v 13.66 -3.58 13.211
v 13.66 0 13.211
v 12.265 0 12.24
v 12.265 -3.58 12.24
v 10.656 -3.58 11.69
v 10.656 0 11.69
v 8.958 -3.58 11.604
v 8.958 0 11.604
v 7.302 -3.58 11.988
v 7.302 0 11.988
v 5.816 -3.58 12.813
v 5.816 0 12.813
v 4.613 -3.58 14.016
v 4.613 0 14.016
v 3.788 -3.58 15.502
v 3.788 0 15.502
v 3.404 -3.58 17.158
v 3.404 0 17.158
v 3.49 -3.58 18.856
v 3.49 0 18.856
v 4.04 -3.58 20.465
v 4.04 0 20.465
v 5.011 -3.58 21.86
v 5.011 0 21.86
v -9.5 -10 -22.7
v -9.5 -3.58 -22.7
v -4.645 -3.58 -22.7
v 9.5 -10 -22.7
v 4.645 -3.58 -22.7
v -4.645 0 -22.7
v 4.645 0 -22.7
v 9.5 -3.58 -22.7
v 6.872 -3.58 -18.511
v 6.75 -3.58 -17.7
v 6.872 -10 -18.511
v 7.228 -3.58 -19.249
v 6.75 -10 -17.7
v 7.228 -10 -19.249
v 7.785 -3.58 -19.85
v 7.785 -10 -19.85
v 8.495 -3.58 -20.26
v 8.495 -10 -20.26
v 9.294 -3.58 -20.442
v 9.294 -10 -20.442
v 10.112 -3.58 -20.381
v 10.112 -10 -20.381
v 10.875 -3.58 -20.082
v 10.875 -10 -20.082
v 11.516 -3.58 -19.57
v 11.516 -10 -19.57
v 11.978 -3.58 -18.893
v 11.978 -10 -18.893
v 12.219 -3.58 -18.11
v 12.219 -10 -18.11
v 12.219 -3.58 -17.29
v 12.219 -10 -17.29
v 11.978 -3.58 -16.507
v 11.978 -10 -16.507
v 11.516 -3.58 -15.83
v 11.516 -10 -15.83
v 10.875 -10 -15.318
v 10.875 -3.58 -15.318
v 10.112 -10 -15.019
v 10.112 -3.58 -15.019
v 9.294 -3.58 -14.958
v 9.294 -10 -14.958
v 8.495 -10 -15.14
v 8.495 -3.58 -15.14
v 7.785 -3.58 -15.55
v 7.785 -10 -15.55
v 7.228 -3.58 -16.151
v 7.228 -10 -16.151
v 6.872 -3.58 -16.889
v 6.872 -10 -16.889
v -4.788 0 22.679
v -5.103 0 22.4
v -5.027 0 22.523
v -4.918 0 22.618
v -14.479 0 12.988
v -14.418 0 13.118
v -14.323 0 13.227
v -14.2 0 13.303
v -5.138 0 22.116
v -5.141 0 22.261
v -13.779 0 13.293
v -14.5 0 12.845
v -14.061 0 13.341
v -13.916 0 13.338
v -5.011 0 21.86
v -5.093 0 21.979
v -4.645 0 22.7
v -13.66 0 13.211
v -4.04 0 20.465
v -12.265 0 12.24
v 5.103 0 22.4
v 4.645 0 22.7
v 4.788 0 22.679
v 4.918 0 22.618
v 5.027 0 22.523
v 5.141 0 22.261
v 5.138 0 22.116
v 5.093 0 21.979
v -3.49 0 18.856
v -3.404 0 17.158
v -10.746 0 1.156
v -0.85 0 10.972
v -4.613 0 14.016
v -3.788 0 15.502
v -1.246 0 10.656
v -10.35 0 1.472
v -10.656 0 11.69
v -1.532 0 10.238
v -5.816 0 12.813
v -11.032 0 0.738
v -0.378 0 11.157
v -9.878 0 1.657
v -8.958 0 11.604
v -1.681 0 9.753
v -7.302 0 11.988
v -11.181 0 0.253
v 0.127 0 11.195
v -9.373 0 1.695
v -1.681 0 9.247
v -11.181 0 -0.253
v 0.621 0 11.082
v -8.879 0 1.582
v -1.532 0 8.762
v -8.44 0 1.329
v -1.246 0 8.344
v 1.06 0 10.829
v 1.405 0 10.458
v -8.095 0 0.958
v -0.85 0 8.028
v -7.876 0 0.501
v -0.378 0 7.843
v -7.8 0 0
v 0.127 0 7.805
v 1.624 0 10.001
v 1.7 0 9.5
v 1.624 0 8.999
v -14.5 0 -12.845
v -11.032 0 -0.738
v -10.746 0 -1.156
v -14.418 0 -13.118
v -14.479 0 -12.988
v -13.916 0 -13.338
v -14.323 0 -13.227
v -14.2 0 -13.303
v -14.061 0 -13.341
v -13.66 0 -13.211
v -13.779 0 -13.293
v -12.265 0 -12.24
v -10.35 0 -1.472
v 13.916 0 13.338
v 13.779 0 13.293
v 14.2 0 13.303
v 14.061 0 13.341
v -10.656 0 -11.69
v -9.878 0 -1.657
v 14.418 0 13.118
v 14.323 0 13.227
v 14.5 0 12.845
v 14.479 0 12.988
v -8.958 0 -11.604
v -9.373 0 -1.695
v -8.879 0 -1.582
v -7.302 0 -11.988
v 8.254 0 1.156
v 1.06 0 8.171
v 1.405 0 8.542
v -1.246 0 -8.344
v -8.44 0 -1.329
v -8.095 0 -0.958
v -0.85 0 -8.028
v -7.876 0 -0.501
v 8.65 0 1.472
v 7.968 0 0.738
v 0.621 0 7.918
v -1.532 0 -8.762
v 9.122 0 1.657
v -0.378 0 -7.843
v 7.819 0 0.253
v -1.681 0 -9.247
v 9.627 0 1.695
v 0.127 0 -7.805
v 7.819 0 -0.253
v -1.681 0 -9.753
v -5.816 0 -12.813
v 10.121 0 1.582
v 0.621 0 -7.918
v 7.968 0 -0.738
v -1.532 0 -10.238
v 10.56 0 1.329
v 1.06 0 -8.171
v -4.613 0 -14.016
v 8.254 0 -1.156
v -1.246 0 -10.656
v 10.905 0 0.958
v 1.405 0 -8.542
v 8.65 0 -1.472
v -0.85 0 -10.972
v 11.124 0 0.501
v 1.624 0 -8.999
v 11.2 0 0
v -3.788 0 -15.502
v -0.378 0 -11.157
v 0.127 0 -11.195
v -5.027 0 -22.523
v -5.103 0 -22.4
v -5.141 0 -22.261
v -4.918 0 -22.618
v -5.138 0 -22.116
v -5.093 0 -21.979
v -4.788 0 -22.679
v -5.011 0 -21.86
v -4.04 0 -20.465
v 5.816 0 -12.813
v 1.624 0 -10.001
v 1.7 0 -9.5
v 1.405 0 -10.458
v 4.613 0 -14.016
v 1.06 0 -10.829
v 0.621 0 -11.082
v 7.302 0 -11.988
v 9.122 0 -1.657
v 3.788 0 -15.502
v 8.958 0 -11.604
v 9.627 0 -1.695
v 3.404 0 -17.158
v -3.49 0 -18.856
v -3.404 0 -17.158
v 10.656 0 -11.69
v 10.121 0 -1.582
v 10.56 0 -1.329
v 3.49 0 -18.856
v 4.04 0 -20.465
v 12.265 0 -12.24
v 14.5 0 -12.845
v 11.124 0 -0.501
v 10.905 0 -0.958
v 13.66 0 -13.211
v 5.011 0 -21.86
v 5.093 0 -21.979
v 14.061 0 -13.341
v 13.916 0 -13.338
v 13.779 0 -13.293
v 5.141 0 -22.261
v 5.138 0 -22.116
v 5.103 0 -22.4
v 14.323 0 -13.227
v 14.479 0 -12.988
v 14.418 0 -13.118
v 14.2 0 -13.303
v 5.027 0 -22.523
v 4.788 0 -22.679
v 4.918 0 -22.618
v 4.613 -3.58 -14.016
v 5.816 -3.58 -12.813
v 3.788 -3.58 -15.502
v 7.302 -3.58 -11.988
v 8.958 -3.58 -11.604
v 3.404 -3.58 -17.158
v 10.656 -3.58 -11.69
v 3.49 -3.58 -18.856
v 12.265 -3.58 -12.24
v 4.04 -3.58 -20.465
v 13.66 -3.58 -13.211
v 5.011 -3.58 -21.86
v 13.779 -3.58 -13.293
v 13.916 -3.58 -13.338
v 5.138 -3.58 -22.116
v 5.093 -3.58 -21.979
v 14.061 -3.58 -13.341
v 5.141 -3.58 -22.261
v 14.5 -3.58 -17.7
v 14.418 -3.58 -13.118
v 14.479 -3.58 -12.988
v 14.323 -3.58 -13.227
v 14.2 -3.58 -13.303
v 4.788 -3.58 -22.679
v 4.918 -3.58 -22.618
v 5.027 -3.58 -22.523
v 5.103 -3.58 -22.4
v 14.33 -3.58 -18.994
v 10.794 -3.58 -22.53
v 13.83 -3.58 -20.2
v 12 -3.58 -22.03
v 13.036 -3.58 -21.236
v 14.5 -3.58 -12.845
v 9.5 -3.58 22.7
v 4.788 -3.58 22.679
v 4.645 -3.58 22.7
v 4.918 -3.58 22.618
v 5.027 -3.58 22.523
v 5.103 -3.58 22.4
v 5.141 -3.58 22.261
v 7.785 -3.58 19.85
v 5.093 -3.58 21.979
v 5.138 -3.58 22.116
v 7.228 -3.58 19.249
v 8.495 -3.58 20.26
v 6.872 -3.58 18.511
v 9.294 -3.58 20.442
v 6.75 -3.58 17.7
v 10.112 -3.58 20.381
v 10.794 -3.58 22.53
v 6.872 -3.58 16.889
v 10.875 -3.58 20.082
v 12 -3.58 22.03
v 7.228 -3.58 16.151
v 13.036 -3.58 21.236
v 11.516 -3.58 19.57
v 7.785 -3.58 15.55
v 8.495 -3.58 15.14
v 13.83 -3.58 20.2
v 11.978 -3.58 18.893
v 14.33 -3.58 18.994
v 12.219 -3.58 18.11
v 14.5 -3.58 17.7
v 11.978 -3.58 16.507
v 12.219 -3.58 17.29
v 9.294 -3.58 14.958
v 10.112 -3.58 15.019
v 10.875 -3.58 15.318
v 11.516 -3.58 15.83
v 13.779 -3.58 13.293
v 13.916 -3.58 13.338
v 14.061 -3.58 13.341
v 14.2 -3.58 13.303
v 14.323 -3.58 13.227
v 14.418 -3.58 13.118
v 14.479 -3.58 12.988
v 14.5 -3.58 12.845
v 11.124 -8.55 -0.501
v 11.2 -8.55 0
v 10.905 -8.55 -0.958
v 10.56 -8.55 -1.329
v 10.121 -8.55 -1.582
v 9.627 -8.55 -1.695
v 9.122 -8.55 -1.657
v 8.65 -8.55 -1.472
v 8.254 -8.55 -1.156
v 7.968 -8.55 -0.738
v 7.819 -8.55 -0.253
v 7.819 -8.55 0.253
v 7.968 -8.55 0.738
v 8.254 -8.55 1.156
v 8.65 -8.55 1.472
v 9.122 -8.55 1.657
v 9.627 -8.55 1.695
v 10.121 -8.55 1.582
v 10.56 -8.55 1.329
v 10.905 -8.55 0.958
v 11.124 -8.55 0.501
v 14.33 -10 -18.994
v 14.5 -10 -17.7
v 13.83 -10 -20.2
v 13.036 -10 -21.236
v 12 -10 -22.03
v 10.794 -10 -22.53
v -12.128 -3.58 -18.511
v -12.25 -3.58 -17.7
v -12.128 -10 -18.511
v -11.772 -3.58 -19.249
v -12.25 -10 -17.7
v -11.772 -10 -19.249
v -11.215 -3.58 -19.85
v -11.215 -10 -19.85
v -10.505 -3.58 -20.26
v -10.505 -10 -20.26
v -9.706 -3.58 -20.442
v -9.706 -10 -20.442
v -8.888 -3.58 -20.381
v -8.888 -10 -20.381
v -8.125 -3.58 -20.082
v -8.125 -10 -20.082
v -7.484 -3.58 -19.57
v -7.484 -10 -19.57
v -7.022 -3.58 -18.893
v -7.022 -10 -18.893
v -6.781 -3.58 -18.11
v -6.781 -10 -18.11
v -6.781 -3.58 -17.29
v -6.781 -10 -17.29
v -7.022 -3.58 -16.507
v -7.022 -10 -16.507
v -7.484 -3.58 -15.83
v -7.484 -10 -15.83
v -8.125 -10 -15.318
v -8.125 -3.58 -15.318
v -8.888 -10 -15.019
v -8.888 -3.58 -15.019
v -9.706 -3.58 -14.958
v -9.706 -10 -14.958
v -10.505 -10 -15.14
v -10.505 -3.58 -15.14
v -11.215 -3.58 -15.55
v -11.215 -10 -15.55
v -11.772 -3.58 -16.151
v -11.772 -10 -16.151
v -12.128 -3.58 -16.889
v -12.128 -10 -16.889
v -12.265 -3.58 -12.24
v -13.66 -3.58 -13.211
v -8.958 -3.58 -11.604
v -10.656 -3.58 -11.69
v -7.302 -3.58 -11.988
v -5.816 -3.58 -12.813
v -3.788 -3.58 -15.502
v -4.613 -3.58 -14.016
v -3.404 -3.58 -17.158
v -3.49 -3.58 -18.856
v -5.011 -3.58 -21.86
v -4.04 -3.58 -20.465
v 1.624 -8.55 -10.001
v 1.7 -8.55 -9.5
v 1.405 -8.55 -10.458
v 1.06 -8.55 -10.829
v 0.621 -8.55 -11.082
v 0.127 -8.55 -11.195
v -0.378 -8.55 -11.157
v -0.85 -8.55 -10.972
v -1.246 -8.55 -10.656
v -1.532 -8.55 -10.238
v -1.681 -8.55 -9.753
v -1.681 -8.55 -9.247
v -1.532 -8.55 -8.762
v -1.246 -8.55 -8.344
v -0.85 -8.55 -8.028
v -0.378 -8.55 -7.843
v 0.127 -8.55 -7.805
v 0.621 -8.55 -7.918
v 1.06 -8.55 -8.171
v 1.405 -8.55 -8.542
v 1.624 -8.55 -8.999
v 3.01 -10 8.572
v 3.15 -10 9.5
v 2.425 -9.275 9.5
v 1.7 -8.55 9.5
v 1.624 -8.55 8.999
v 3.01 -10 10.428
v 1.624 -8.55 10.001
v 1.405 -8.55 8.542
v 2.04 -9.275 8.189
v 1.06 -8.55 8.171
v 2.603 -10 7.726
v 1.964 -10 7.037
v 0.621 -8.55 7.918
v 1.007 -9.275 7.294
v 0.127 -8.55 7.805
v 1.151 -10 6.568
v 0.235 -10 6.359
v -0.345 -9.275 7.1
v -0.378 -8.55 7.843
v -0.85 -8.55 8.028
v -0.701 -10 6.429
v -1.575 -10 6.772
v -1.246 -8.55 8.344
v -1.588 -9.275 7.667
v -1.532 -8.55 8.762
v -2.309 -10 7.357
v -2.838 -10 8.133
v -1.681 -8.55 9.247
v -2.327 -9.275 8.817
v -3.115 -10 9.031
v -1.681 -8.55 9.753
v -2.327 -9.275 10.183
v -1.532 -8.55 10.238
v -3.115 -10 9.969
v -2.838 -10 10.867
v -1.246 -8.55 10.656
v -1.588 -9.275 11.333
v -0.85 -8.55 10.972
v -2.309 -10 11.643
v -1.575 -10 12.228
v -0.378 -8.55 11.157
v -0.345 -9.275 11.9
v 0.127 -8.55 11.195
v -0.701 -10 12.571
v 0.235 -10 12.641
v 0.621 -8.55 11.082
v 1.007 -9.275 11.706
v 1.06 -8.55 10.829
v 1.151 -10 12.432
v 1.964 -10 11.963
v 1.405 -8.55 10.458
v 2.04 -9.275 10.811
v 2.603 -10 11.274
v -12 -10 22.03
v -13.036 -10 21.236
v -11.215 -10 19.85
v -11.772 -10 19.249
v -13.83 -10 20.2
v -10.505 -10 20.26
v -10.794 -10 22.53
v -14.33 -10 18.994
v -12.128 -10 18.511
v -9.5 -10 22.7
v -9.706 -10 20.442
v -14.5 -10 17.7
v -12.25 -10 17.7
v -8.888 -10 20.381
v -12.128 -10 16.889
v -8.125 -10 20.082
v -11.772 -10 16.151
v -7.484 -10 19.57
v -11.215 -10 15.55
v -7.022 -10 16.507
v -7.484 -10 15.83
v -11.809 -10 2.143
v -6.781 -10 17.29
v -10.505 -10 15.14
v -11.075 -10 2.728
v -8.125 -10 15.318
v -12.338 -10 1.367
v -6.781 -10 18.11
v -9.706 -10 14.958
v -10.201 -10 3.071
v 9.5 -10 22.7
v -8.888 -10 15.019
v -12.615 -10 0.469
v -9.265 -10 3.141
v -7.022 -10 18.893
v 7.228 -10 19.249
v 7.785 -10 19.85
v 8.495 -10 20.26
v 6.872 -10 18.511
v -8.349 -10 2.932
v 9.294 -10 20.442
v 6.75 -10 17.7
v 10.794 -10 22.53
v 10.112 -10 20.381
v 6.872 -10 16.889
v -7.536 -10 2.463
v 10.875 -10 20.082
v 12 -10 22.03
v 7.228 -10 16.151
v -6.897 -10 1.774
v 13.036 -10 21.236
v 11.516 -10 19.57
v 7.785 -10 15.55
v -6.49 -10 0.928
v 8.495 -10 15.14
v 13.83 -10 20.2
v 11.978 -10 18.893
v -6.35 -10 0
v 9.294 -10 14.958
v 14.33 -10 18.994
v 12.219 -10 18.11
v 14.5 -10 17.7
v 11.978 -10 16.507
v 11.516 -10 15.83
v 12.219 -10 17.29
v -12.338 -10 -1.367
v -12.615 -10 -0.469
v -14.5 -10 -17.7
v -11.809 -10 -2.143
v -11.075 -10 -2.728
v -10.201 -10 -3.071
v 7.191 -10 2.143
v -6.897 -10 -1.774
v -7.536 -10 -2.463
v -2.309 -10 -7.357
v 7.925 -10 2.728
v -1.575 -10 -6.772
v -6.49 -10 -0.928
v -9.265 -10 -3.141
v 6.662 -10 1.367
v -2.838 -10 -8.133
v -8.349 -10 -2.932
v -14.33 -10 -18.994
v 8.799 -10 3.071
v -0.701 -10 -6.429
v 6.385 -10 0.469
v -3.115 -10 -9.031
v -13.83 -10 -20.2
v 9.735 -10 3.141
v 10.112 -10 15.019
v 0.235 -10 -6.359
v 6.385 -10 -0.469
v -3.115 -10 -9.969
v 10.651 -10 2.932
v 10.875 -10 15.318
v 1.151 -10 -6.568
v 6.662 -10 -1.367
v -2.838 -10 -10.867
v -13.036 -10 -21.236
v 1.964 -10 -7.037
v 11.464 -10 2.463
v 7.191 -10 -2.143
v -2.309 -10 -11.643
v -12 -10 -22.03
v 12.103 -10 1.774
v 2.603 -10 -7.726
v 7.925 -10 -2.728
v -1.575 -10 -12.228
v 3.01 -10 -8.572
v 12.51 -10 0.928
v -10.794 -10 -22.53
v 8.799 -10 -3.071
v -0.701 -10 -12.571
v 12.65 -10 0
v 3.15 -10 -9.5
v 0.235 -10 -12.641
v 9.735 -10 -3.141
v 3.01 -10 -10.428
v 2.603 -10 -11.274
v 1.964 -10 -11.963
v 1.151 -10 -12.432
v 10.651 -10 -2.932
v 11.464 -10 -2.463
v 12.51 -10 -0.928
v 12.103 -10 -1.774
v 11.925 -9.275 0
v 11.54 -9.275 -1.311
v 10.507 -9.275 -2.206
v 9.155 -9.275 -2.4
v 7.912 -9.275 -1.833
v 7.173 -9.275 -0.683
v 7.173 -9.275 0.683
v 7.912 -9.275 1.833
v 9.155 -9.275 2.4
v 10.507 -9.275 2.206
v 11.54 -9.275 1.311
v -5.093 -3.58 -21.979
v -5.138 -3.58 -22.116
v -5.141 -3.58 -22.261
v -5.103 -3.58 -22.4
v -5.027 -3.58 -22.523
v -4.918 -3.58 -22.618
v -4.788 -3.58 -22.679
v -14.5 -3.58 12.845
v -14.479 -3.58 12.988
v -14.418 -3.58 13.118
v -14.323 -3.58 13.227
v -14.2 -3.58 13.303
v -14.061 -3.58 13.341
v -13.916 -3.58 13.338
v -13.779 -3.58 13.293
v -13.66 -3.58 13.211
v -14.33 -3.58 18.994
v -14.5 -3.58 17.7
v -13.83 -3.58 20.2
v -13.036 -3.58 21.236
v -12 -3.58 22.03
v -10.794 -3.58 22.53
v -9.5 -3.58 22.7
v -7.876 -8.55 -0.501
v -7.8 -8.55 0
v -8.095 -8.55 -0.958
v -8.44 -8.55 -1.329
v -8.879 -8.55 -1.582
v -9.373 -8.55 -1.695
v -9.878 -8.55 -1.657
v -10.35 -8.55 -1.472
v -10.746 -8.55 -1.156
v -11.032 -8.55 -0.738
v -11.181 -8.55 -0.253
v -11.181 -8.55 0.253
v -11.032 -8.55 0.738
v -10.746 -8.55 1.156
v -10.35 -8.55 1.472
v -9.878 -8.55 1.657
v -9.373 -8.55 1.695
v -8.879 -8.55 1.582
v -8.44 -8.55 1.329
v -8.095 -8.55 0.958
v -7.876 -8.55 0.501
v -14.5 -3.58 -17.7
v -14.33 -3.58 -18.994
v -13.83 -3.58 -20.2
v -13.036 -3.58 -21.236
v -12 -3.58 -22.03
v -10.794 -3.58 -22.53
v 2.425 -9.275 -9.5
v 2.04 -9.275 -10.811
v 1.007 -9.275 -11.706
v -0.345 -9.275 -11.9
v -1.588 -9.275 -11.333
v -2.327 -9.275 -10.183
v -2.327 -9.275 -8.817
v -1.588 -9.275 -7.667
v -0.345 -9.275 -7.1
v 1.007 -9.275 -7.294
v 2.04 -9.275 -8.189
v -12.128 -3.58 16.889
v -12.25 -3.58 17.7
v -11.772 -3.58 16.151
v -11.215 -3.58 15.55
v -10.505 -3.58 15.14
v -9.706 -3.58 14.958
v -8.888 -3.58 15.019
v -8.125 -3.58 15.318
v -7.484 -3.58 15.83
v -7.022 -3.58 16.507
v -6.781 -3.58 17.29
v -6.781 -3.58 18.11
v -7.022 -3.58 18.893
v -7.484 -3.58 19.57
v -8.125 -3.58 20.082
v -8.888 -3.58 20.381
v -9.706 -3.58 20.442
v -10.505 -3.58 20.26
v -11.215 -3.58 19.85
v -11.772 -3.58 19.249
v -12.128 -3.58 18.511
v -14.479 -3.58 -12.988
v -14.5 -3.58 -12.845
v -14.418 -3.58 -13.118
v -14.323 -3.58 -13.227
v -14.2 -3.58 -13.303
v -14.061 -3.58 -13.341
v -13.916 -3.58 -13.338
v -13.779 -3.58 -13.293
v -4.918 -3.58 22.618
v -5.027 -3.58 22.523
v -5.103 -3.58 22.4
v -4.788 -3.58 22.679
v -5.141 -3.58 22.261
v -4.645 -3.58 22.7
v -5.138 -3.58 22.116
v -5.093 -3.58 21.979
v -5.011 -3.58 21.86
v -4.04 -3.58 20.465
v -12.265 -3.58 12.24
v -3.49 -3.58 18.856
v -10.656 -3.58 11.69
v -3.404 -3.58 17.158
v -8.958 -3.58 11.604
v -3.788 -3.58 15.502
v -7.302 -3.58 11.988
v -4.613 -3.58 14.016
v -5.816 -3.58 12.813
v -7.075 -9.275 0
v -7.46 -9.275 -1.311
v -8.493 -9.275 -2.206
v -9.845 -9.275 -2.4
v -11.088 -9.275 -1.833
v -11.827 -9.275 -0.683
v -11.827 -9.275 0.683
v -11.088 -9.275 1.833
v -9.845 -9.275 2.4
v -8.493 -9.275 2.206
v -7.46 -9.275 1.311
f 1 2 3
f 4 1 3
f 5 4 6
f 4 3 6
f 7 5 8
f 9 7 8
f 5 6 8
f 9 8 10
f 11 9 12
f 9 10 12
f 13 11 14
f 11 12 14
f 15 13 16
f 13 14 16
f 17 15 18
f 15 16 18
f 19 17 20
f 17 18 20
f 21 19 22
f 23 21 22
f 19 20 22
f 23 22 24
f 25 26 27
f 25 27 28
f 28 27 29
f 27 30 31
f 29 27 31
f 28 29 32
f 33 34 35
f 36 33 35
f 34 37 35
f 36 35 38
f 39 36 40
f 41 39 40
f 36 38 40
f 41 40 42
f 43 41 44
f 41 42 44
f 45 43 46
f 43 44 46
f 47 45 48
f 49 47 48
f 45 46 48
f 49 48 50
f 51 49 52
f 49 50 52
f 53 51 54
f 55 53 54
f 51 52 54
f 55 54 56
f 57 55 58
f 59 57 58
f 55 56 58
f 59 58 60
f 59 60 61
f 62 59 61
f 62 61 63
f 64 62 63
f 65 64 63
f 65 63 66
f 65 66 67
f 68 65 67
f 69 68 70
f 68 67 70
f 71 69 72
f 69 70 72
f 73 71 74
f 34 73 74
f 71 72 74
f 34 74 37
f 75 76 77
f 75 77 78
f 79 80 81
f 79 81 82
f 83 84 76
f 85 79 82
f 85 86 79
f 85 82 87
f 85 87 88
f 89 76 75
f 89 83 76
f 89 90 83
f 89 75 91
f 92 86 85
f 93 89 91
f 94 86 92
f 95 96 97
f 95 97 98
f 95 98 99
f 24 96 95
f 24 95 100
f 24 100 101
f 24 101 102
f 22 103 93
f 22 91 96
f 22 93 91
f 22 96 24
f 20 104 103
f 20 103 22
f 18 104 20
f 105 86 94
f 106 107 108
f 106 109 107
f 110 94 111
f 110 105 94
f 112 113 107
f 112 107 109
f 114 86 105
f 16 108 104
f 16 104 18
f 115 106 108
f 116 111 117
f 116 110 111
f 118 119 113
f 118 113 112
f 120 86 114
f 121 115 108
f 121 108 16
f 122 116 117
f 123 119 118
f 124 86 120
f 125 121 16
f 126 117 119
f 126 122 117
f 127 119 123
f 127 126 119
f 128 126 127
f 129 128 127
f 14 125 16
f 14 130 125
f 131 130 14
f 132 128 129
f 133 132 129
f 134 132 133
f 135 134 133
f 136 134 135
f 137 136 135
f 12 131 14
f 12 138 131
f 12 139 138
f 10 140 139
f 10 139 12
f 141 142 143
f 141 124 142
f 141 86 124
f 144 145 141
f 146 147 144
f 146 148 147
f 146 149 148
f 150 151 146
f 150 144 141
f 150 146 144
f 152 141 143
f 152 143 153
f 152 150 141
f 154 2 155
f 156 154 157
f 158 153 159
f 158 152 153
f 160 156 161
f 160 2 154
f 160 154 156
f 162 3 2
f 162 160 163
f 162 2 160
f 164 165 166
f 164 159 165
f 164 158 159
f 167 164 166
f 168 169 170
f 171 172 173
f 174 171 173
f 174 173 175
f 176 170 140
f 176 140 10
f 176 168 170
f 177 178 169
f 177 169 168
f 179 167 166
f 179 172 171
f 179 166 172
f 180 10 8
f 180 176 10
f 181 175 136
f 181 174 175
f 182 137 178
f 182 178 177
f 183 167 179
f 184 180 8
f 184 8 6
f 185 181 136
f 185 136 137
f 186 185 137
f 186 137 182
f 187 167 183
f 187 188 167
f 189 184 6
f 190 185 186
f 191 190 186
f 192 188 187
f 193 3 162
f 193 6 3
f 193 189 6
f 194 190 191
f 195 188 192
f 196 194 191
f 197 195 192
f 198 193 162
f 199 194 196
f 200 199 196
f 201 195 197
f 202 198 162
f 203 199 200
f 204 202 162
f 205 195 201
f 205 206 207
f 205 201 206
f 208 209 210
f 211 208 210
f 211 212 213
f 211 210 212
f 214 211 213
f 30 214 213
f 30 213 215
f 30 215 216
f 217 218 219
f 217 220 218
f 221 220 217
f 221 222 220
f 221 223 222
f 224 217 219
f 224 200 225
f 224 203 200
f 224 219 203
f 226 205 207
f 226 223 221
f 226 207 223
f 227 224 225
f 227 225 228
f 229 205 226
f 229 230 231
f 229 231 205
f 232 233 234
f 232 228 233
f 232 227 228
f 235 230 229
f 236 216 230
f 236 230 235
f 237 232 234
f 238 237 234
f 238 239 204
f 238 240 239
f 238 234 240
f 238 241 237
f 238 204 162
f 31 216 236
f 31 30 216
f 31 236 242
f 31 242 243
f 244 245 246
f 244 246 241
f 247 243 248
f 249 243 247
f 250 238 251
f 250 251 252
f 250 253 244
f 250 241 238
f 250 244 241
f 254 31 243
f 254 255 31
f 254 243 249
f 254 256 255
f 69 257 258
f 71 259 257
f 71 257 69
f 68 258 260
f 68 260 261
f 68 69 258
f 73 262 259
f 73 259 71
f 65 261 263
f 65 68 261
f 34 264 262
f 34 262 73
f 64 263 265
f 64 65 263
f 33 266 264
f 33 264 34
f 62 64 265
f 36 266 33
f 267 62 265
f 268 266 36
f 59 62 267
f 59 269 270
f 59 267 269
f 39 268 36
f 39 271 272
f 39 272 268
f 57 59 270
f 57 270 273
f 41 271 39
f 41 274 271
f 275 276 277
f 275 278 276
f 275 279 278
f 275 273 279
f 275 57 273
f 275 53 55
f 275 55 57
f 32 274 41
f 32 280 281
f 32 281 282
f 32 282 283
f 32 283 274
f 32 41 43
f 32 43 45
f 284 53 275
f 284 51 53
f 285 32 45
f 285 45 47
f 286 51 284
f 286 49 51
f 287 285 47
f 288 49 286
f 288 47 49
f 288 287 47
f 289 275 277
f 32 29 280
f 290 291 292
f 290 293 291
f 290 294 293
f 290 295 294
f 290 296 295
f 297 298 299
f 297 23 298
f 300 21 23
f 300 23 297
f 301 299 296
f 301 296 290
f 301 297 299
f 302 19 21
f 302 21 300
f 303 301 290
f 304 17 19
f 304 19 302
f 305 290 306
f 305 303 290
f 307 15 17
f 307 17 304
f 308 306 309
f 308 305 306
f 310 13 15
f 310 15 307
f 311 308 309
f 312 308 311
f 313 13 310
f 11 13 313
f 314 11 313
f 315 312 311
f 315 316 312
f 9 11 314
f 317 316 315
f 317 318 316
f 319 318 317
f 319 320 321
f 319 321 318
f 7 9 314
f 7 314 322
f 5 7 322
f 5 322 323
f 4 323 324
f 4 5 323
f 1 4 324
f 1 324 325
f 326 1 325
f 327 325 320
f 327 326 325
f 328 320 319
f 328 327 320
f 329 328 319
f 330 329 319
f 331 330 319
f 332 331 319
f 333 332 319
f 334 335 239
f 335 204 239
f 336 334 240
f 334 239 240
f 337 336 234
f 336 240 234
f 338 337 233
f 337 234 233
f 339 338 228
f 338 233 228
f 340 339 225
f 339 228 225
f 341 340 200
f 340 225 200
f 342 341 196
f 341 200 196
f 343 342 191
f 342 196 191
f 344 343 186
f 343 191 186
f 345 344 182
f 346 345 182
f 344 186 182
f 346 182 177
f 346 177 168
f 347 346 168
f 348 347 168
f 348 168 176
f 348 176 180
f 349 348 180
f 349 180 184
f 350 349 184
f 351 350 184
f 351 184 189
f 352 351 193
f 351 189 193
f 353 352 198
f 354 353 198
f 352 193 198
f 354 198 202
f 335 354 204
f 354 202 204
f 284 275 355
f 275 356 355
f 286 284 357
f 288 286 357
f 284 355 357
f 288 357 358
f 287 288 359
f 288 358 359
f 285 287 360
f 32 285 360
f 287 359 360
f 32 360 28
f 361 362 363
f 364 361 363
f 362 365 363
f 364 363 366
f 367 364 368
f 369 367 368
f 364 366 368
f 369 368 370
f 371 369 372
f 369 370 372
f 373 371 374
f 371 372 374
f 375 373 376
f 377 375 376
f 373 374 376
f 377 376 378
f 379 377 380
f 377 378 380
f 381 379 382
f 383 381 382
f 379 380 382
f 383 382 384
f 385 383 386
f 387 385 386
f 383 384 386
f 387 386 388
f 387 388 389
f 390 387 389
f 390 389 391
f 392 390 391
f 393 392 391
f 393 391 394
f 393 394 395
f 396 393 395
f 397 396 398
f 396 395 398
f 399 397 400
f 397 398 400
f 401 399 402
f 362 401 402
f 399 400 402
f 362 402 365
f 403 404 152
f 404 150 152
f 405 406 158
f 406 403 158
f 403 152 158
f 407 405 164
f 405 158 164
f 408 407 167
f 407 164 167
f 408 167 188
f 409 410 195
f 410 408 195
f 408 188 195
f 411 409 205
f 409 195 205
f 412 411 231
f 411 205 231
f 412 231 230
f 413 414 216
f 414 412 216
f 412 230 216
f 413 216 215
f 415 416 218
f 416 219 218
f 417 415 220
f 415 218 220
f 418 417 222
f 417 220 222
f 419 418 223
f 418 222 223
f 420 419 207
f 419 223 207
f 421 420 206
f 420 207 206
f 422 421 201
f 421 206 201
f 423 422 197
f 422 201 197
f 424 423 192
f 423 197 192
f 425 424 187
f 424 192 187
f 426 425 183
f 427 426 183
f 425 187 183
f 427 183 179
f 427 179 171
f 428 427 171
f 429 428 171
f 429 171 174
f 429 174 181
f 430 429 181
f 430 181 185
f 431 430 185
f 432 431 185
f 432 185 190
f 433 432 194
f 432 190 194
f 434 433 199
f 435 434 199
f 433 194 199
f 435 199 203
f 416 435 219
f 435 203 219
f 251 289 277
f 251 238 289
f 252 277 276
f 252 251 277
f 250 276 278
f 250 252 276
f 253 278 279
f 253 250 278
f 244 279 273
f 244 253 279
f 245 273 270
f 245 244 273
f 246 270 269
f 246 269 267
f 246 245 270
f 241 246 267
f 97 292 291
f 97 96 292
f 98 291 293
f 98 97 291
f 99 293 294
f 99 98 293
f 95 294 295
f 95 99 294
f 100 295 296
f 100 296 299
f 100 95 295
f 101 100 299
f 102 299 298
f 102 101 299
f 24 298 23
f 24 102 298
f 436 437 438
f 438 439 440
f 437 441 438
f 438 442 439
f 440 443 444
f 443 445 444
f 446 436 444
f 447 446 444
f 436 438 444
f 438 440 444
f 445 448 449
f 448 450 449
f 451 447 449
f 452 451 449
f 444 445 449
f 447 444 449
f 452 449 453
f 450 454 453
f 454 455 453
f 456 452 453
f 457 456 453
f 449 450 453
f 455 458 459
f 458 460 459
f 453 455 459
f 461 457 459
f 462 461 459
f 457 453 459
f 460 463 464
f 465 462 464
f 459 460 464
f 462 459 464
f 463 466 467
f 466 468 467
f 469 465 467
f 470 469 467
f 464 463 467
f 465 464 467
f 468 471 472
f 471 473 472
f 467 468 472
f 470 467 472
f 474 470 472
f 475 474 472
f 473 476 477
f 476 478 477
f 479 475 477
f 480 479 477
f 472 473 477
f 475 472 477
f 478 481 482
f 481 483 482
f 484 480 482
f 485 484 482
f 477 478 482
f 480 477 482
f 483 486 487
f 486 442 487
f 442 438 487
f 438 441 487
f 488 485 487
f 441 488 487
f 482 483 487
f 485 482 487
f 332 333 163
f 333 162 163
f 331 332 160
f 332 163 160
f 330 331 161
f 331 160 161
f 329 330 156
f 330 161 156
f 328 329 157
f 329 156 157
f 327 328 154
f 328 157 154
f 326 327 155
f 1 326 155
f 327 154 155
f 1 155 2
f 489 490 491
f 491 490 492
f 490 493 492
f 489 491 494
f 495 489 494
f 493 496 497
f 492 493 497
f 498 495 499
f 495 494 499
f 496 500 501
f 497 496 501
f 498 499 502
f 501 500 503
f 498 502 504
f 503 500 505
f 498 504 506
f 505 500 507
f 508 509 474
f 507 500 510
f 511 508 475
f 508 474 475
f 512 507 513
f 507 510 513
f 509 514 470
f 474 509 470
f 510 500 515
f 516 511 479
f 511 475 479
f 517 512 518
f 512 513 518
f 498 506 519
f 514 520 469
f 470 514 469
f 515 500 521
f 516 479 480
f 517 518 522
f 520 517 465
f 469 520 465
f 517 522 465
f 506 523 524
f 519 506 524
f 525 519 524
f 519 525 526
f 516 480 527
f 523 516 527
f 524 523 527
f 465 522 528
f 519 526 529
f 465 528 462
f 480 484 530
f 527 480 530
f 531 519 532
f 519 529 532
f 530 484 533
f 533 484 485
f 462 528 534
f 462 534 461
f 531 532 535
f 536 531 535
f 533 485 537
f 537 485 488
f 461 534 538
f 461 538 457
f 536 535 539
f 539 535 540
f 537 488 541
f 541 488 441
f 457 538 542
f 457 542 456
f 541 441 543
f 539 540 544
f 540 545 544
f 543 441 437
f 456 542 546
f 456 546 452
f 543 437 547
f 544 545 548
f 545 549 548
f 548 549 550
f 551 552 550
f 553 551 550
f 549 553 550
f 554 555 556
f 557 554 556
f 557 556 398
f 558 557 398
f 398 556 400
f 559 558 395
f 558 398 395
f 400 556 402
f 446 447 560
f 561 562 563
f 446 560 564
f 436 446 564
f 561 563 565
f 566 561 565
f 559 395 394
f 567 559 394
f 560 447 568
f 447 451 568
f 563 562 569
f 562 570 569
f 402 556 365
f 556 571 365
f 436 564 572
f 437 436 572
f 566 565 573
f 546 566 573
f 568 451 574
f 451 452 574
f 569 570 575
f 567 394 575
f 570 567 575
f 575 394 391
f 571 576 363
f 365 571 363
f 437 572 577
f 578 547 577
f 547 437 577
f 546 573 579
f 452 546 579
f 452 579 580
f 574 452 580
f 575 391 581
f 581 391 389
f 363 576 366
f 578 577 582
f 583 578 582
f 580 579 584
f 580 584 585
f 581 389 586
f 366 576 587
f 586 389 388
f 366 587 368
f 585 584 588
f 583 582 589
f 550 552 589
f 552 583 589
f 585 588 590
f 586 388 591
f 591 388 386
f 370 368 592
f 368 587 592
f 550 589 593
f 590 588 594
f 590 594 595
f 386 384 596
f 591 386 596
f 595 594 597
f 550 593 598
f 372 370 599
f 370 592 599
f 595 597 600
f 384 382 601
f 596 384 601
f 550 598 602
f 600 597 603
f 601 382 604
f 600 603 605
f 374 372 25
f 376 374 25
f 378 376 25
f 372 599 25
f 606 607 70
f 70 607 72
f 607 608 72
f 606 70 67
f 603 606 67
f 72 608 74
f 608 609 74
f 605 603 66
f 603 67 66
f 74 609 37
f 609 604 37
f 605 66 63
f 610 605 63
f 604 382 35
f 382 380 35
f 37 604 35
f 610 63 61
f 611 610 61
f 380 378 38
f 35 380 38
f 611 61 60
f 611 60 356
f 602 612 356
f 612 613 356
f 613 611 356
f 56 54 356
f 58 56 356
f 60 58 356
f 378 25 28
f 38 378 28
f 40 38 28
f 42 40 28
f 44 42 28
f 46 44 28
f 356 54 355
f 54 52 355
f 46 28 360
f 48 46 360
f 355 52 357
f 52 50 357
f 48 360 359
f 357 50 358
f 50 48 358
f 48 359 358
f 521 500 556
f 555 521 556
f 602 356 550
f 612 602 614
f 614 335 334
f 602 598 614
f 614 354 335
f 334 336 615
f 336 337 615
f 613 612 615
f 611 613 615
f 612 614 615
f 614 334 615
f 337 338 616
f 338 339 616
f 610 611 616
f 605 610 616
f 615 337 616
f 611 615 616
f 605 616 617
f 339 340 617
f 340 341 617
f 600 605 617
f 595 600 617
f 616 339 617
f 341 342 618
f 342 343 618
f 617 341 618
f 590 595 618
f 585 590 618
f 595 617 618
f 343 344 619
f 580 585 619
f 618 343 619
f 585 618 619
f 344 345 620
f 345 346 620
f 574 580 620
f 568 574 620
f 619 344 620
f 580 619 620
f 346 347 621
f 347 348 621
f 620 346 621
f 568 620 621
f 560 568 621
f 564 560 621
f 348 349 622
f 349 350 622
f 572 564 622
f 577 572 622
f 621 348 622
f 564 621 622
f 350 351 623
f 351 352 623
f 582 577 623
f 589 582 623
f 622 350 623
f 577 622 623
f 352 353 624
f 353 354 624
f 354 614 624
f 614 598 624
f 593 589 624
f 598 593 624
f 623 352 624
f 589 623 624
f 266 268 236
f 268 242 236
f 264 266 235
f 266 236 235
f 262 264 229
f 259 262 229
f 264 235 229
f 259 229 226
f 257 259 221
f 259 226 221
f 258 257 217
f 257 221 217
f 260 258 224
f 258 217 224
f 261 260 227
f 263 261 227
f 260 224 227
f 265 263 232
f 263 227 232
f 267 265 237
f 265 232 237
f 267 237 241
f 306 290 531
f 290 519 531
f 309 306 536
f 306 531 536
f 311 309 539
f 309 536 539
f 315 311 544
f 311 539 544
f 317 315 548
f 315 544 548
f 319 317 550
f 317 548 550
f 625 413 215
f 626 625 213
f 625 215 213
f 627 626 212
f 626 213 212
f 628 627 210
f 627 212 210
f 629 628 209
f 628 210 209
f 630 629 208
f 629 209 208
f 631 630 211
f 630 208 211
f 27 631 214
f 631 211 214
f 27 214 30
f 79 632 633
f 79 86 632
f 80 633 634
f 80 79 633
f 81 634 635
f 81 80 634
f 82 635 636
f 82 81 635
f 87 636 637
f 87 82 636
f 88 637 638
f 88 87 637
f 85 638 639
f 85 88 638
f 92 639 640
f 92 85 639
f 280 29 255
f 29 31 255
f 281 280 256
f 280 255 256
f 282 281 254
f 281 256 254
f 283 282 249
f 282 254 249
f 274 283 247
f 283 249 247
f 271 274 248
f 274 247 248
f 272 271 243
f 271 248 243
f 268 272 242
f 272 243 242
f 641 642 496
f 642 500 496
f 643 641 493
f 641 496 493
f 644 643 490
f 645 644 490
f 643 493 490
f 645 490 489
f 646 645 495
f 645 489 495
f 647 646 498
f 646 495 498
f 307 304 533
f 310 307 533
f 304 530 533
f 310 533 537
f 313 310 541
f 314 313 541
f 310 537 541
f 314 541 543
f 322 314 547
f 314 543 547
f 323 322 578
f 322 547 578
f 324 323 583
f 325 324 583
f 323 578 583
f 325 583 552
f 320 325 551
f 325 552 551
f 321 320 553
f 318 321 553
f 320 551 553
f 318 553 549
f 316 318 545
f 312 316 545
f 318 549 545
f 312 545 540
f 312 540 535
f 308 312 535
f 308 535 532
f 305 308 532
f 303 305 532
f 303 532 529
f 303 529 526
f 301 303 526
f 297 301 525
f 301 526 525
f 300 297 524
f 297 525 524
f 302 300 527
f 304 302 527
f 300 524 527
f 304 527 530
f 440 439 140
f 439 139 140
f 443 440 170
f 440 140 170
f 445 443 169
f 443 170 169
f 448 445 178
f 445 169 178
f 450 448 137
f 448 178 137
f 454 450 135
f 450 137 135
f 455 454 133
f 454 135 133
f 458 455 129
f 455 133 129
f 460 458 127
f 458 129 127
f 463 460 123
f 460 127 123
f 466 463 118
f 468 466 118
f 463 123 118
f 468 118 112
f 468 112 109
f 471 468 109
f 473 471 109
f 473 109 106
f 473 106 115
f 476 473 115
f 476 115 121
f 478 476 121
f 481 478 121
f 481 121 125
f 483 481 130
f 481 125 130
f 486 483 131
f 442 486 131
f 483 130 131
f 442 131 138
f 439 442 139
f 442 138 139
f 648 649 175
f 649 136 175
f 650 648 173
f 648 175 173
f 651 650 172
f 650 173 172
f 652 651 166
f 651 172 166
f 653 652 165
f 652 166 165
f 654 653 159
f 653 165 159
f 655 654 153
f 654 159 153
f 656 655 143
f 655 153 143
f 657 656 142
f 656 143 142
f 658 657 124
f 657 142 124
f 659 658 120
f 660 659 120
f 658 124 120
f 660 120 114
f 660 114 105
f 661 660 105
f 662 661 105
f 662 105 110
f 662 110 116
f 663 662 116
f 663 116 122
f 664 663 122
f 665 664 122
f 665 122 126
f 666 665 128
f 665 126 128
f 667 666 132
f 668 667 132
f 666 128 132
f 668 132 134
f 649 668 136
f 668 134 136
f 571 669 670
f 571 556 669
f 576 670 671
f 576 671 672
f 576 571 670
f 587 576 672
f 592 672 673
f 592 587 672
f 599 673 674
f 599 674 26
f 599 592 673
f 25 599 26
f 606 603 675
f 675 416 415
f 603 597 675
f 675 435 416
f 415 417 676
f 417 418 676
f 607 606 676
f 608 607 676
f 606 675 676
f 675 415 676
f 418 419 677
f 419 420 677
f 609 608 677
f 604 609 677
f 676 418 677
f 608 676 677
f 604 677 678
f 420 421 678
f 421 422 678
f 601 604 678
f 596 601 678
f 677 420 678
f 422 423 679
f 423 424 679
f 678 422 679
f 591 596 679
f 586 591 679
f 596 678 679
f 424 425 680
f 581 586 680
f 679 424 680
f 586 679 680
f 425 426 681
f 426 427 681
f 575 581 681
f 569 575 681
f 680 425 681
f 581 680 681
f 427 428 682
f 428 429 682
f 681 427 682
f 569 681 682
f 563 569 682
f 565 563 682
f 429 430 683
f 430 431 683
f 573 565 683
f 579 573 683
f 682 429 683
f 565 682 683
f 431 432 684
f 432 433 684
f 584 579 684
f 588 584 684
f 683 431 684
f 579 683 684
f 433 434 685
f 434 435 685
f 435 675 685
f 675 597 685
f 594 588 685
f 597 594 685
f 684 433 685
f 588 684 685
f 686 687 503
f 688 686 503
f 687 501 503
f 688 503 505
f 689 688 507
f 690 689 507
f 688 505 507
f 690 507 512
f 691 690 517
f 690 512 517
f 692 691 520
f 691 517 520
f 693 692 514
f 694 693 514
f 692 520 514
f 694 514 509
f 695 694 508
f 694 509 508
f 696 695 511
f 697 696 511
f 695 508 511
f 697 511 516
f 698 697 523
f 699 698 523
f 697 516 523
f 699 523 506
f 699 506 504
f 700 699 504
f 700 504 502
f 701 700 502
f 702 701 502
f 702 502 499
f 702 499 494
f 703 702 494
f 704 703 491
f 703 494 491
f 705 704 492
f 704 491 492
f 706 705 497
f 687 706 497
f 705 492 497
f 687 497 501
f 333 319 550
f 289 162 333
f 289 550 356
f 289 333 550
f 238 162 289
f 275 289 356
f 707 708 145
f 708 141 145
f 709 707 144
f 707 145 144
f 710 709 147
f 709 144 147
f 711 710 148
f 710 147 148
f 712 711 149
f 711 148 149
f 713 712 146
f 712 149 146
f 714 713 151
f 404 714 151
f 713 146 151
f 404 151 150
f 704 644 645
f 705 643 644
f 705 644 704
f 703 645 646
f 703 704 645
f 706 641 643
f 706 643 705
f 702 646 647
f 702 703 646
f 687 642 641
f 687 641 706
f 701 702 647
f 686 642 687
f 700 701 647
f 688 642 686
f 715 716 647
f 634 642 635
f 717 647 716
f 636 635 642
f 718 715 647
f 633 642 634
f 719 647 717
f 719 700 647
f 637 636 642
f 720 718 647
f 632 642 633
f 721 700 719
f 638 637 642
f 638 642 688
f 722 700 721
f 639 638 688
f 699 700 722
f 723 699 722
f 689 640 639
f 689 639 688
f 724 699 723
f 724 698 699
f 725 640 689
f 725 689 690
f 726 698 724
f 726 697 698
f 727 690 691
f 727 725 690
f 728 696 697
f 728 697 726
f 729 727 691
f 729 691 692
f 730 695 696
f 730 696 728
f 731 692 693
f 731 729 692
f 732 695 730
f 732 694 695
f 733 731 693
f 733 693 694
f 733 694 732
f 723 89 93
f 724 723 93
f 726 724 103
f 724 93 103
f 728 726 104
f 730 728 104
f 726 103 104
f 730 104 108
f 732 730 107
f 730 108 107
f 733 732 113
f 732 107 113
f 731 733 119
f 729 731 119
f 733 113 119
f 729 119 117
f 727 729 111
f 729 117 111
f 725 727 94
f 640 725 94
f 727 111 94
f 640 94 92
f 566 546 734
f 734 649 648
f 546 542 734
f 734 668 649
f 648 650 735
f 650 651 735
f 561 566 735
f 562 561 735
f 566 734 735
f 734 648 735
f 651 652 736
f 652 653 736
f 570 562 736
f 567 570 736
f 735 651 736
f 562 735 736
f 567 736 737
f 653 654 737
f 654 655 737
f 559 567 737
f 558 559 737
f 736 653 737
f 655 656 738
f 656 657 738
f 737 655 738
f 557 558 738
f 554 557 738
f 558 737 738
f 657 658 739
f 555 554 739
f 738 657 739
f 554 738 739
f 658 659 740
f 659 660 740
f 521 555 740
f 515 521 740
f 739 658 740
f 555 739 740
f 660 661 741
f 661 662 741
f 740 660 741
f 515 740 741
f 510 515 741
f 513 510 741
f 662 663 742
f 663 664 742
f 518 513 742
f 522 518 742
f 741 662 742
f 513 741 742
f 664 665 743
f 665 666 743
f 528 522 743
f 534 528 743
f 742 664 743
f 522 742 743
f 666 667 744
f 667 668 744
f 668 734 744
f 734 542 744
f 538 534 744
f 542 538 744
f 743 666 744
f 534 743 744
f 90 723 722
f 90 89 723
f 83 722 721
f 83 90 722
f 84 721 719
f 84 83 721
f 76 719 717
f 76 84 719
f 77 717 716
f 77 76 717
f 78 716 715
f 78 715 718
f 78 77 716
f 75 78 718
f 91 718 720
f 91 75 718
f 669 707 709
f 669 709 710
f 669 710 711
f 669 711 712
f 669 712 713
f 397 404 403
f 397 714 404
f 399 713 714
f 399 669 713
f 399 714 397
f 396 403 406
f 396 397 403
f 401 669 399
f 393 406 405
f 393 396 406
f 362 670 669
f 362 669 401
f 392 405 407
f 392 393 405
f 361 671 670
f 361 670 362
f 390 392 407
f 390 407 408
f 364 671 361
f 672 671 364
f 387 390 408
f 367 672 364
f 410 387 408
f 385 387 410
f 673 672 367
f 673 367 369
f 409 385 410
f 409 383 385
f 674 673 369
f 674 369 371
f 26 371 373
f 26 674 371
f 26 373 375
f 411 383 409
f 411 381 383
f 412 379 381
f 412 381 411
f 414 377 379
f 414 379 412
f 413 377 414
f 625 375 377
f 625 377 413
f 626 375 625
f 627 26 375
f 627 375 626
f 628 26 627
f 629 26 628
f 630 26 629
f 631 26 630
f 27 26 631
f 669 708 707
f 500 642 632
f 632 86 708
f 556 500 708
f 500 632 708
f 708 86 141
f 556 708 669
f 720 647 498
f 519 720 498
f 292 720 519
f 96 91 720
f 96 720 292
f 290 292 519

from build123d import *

# Parameters (mm, degrees)
SKETCH1_W                                       = 29
SKETCH1_H                                       = 45.4
BOSS_EXTRUDE1_DEPTH                             = 10
CBORE_FOR_M5_HEX_HEAD_BOLT1_D                   = 5.5
CBORE_FOR_M5_HEX_HEAD_BOLT1_DEPTH               = 15
CBORE_FOR_M5_HEX_HEAD_BOLT1_CBORE_D             = 12.24
CBORE_FOR_M5_HEX_HEAD_BOLT1_CBORE_DEPTH         = 3.58
CBORE_FOR_M5_HEX_HEAD_BOLT1_TIP                 = 1.652366702
CSK_FOR_M3_FLAT_HEAD_MACHINE_SCREW1_D           = 3.4
CSK_FOR_M3_FLAT_HEAD_MACHINE_SCREW1_CSINK_D     = 6.3
CSK_FOR_M3_FLAT_HEAD_MACHINE_SCREW1_CSINK_ANGLE = 90
FILLET1_R                                       = 5
FILLET2_R                                       = 0.5


with BuildPart() as part:
    # Sketch1 → Boss-Extrude1 (new body)
    with BuildSketch(Plane(origin=(0, 0, 0), x_dir=(1, 0, 0), z_dir=(0, 1, 0))):
        Rectangle(SKETCH1_W, SKETCH1_H)
    extrude(amount=-BOSS_EXTRUDE1_DEPTH)

    # CBORE for M5 Hex Head Bolt1
    with Locations(Plane(origin=(0, 0, 0), x_dir=(1, 0, 0), z_dir=(0, 1, 0))):
        with Locations((-9.5, 17.7), (9.5, 17.7), (9.5, -17.7), (-9.5, -17.7)):
            CounterBoreHole(CBORE_FOR_M5_HEX_HEAD_BOLT1_D / 2, CBORE_FOR_M5_HEX_HEAD_BOLT1_CBORE_D / 2, CBORE_FOR_M5_HEX_HEAD_BOLT1_CBORE_DEPTH, depth=CBORE_FOR_M5_HEX_HEAD_BOLT1_DEPTH)
            with Locations((0, 0, -(CBORE_FOR_M5_HEX_HEAD_BOLT1_DEPTH + CBORE_FOR_M5_HEX_HEAD_BOLT1_TIP / 2))):  # 118° drill point
                Cone(0, CBORE_FOR_M5_HEX_HEAD_BOLT1_D / 2, CBORE_FOR_M5_HEX_HEAD_BOLT1_TIP, mode=Mode.SUBTRACT)

    # CSK for M3 Flat Head Machine Screw1 (through all)
    with Locations(Plane(origin=(0, -10, 0), x_dir=(-1, 0, 0), z_dir=(0, -1, 0))):
        with Locations((-9.5, 0), (0, 9.5), (9.5, 0), (0, -9.5)):
            CounterSinkHole(CSK_FOR_M3_FLAT_HEAD_MACHINE_SCREW1_D / 2, CSK_FOR_M3_FLAT_HEAD_MACHINE_SCREW1_CSINK_D / 2, counter_sink_angle=CSK_FOR_M3_FLAT_HEAD_MACHINE_SCREW1_CSINK_ANGLE)

    # Fillet1
    fillet1_edges = [part.edges().sort_by_distance(p)[0] for p in [
        (-14.5, -5, -22.7),
        (14.5, -5, -22.7),
        (14.5, -5, 22.7),
        (-14.5, -5, 22.7),
    ]]
    fillet(fillet1_edges, radius=FILLET1_R)

    # Fillet2
    fillet2_edges = [part.edges().sort_by_distance(p)[0] for p in [
        (-5.9709208, -1.79, 22.7),
        (-14.5, -1.79, 14.1709208),
        (14.5, -1.79, 14.1709208),
        (5.9709208, -1.79, 22.7),
        (14.5, -1.79, -14.1709208),
        (5.9709208, -1.79, -22.7),
        (-5.9709208, -1.79, -22.7),
        (-14.5, -1.79, -14.1709208),
    ]]
    fillet(fillet2_edges, radius=FILLET2_R)


solid = part.part
